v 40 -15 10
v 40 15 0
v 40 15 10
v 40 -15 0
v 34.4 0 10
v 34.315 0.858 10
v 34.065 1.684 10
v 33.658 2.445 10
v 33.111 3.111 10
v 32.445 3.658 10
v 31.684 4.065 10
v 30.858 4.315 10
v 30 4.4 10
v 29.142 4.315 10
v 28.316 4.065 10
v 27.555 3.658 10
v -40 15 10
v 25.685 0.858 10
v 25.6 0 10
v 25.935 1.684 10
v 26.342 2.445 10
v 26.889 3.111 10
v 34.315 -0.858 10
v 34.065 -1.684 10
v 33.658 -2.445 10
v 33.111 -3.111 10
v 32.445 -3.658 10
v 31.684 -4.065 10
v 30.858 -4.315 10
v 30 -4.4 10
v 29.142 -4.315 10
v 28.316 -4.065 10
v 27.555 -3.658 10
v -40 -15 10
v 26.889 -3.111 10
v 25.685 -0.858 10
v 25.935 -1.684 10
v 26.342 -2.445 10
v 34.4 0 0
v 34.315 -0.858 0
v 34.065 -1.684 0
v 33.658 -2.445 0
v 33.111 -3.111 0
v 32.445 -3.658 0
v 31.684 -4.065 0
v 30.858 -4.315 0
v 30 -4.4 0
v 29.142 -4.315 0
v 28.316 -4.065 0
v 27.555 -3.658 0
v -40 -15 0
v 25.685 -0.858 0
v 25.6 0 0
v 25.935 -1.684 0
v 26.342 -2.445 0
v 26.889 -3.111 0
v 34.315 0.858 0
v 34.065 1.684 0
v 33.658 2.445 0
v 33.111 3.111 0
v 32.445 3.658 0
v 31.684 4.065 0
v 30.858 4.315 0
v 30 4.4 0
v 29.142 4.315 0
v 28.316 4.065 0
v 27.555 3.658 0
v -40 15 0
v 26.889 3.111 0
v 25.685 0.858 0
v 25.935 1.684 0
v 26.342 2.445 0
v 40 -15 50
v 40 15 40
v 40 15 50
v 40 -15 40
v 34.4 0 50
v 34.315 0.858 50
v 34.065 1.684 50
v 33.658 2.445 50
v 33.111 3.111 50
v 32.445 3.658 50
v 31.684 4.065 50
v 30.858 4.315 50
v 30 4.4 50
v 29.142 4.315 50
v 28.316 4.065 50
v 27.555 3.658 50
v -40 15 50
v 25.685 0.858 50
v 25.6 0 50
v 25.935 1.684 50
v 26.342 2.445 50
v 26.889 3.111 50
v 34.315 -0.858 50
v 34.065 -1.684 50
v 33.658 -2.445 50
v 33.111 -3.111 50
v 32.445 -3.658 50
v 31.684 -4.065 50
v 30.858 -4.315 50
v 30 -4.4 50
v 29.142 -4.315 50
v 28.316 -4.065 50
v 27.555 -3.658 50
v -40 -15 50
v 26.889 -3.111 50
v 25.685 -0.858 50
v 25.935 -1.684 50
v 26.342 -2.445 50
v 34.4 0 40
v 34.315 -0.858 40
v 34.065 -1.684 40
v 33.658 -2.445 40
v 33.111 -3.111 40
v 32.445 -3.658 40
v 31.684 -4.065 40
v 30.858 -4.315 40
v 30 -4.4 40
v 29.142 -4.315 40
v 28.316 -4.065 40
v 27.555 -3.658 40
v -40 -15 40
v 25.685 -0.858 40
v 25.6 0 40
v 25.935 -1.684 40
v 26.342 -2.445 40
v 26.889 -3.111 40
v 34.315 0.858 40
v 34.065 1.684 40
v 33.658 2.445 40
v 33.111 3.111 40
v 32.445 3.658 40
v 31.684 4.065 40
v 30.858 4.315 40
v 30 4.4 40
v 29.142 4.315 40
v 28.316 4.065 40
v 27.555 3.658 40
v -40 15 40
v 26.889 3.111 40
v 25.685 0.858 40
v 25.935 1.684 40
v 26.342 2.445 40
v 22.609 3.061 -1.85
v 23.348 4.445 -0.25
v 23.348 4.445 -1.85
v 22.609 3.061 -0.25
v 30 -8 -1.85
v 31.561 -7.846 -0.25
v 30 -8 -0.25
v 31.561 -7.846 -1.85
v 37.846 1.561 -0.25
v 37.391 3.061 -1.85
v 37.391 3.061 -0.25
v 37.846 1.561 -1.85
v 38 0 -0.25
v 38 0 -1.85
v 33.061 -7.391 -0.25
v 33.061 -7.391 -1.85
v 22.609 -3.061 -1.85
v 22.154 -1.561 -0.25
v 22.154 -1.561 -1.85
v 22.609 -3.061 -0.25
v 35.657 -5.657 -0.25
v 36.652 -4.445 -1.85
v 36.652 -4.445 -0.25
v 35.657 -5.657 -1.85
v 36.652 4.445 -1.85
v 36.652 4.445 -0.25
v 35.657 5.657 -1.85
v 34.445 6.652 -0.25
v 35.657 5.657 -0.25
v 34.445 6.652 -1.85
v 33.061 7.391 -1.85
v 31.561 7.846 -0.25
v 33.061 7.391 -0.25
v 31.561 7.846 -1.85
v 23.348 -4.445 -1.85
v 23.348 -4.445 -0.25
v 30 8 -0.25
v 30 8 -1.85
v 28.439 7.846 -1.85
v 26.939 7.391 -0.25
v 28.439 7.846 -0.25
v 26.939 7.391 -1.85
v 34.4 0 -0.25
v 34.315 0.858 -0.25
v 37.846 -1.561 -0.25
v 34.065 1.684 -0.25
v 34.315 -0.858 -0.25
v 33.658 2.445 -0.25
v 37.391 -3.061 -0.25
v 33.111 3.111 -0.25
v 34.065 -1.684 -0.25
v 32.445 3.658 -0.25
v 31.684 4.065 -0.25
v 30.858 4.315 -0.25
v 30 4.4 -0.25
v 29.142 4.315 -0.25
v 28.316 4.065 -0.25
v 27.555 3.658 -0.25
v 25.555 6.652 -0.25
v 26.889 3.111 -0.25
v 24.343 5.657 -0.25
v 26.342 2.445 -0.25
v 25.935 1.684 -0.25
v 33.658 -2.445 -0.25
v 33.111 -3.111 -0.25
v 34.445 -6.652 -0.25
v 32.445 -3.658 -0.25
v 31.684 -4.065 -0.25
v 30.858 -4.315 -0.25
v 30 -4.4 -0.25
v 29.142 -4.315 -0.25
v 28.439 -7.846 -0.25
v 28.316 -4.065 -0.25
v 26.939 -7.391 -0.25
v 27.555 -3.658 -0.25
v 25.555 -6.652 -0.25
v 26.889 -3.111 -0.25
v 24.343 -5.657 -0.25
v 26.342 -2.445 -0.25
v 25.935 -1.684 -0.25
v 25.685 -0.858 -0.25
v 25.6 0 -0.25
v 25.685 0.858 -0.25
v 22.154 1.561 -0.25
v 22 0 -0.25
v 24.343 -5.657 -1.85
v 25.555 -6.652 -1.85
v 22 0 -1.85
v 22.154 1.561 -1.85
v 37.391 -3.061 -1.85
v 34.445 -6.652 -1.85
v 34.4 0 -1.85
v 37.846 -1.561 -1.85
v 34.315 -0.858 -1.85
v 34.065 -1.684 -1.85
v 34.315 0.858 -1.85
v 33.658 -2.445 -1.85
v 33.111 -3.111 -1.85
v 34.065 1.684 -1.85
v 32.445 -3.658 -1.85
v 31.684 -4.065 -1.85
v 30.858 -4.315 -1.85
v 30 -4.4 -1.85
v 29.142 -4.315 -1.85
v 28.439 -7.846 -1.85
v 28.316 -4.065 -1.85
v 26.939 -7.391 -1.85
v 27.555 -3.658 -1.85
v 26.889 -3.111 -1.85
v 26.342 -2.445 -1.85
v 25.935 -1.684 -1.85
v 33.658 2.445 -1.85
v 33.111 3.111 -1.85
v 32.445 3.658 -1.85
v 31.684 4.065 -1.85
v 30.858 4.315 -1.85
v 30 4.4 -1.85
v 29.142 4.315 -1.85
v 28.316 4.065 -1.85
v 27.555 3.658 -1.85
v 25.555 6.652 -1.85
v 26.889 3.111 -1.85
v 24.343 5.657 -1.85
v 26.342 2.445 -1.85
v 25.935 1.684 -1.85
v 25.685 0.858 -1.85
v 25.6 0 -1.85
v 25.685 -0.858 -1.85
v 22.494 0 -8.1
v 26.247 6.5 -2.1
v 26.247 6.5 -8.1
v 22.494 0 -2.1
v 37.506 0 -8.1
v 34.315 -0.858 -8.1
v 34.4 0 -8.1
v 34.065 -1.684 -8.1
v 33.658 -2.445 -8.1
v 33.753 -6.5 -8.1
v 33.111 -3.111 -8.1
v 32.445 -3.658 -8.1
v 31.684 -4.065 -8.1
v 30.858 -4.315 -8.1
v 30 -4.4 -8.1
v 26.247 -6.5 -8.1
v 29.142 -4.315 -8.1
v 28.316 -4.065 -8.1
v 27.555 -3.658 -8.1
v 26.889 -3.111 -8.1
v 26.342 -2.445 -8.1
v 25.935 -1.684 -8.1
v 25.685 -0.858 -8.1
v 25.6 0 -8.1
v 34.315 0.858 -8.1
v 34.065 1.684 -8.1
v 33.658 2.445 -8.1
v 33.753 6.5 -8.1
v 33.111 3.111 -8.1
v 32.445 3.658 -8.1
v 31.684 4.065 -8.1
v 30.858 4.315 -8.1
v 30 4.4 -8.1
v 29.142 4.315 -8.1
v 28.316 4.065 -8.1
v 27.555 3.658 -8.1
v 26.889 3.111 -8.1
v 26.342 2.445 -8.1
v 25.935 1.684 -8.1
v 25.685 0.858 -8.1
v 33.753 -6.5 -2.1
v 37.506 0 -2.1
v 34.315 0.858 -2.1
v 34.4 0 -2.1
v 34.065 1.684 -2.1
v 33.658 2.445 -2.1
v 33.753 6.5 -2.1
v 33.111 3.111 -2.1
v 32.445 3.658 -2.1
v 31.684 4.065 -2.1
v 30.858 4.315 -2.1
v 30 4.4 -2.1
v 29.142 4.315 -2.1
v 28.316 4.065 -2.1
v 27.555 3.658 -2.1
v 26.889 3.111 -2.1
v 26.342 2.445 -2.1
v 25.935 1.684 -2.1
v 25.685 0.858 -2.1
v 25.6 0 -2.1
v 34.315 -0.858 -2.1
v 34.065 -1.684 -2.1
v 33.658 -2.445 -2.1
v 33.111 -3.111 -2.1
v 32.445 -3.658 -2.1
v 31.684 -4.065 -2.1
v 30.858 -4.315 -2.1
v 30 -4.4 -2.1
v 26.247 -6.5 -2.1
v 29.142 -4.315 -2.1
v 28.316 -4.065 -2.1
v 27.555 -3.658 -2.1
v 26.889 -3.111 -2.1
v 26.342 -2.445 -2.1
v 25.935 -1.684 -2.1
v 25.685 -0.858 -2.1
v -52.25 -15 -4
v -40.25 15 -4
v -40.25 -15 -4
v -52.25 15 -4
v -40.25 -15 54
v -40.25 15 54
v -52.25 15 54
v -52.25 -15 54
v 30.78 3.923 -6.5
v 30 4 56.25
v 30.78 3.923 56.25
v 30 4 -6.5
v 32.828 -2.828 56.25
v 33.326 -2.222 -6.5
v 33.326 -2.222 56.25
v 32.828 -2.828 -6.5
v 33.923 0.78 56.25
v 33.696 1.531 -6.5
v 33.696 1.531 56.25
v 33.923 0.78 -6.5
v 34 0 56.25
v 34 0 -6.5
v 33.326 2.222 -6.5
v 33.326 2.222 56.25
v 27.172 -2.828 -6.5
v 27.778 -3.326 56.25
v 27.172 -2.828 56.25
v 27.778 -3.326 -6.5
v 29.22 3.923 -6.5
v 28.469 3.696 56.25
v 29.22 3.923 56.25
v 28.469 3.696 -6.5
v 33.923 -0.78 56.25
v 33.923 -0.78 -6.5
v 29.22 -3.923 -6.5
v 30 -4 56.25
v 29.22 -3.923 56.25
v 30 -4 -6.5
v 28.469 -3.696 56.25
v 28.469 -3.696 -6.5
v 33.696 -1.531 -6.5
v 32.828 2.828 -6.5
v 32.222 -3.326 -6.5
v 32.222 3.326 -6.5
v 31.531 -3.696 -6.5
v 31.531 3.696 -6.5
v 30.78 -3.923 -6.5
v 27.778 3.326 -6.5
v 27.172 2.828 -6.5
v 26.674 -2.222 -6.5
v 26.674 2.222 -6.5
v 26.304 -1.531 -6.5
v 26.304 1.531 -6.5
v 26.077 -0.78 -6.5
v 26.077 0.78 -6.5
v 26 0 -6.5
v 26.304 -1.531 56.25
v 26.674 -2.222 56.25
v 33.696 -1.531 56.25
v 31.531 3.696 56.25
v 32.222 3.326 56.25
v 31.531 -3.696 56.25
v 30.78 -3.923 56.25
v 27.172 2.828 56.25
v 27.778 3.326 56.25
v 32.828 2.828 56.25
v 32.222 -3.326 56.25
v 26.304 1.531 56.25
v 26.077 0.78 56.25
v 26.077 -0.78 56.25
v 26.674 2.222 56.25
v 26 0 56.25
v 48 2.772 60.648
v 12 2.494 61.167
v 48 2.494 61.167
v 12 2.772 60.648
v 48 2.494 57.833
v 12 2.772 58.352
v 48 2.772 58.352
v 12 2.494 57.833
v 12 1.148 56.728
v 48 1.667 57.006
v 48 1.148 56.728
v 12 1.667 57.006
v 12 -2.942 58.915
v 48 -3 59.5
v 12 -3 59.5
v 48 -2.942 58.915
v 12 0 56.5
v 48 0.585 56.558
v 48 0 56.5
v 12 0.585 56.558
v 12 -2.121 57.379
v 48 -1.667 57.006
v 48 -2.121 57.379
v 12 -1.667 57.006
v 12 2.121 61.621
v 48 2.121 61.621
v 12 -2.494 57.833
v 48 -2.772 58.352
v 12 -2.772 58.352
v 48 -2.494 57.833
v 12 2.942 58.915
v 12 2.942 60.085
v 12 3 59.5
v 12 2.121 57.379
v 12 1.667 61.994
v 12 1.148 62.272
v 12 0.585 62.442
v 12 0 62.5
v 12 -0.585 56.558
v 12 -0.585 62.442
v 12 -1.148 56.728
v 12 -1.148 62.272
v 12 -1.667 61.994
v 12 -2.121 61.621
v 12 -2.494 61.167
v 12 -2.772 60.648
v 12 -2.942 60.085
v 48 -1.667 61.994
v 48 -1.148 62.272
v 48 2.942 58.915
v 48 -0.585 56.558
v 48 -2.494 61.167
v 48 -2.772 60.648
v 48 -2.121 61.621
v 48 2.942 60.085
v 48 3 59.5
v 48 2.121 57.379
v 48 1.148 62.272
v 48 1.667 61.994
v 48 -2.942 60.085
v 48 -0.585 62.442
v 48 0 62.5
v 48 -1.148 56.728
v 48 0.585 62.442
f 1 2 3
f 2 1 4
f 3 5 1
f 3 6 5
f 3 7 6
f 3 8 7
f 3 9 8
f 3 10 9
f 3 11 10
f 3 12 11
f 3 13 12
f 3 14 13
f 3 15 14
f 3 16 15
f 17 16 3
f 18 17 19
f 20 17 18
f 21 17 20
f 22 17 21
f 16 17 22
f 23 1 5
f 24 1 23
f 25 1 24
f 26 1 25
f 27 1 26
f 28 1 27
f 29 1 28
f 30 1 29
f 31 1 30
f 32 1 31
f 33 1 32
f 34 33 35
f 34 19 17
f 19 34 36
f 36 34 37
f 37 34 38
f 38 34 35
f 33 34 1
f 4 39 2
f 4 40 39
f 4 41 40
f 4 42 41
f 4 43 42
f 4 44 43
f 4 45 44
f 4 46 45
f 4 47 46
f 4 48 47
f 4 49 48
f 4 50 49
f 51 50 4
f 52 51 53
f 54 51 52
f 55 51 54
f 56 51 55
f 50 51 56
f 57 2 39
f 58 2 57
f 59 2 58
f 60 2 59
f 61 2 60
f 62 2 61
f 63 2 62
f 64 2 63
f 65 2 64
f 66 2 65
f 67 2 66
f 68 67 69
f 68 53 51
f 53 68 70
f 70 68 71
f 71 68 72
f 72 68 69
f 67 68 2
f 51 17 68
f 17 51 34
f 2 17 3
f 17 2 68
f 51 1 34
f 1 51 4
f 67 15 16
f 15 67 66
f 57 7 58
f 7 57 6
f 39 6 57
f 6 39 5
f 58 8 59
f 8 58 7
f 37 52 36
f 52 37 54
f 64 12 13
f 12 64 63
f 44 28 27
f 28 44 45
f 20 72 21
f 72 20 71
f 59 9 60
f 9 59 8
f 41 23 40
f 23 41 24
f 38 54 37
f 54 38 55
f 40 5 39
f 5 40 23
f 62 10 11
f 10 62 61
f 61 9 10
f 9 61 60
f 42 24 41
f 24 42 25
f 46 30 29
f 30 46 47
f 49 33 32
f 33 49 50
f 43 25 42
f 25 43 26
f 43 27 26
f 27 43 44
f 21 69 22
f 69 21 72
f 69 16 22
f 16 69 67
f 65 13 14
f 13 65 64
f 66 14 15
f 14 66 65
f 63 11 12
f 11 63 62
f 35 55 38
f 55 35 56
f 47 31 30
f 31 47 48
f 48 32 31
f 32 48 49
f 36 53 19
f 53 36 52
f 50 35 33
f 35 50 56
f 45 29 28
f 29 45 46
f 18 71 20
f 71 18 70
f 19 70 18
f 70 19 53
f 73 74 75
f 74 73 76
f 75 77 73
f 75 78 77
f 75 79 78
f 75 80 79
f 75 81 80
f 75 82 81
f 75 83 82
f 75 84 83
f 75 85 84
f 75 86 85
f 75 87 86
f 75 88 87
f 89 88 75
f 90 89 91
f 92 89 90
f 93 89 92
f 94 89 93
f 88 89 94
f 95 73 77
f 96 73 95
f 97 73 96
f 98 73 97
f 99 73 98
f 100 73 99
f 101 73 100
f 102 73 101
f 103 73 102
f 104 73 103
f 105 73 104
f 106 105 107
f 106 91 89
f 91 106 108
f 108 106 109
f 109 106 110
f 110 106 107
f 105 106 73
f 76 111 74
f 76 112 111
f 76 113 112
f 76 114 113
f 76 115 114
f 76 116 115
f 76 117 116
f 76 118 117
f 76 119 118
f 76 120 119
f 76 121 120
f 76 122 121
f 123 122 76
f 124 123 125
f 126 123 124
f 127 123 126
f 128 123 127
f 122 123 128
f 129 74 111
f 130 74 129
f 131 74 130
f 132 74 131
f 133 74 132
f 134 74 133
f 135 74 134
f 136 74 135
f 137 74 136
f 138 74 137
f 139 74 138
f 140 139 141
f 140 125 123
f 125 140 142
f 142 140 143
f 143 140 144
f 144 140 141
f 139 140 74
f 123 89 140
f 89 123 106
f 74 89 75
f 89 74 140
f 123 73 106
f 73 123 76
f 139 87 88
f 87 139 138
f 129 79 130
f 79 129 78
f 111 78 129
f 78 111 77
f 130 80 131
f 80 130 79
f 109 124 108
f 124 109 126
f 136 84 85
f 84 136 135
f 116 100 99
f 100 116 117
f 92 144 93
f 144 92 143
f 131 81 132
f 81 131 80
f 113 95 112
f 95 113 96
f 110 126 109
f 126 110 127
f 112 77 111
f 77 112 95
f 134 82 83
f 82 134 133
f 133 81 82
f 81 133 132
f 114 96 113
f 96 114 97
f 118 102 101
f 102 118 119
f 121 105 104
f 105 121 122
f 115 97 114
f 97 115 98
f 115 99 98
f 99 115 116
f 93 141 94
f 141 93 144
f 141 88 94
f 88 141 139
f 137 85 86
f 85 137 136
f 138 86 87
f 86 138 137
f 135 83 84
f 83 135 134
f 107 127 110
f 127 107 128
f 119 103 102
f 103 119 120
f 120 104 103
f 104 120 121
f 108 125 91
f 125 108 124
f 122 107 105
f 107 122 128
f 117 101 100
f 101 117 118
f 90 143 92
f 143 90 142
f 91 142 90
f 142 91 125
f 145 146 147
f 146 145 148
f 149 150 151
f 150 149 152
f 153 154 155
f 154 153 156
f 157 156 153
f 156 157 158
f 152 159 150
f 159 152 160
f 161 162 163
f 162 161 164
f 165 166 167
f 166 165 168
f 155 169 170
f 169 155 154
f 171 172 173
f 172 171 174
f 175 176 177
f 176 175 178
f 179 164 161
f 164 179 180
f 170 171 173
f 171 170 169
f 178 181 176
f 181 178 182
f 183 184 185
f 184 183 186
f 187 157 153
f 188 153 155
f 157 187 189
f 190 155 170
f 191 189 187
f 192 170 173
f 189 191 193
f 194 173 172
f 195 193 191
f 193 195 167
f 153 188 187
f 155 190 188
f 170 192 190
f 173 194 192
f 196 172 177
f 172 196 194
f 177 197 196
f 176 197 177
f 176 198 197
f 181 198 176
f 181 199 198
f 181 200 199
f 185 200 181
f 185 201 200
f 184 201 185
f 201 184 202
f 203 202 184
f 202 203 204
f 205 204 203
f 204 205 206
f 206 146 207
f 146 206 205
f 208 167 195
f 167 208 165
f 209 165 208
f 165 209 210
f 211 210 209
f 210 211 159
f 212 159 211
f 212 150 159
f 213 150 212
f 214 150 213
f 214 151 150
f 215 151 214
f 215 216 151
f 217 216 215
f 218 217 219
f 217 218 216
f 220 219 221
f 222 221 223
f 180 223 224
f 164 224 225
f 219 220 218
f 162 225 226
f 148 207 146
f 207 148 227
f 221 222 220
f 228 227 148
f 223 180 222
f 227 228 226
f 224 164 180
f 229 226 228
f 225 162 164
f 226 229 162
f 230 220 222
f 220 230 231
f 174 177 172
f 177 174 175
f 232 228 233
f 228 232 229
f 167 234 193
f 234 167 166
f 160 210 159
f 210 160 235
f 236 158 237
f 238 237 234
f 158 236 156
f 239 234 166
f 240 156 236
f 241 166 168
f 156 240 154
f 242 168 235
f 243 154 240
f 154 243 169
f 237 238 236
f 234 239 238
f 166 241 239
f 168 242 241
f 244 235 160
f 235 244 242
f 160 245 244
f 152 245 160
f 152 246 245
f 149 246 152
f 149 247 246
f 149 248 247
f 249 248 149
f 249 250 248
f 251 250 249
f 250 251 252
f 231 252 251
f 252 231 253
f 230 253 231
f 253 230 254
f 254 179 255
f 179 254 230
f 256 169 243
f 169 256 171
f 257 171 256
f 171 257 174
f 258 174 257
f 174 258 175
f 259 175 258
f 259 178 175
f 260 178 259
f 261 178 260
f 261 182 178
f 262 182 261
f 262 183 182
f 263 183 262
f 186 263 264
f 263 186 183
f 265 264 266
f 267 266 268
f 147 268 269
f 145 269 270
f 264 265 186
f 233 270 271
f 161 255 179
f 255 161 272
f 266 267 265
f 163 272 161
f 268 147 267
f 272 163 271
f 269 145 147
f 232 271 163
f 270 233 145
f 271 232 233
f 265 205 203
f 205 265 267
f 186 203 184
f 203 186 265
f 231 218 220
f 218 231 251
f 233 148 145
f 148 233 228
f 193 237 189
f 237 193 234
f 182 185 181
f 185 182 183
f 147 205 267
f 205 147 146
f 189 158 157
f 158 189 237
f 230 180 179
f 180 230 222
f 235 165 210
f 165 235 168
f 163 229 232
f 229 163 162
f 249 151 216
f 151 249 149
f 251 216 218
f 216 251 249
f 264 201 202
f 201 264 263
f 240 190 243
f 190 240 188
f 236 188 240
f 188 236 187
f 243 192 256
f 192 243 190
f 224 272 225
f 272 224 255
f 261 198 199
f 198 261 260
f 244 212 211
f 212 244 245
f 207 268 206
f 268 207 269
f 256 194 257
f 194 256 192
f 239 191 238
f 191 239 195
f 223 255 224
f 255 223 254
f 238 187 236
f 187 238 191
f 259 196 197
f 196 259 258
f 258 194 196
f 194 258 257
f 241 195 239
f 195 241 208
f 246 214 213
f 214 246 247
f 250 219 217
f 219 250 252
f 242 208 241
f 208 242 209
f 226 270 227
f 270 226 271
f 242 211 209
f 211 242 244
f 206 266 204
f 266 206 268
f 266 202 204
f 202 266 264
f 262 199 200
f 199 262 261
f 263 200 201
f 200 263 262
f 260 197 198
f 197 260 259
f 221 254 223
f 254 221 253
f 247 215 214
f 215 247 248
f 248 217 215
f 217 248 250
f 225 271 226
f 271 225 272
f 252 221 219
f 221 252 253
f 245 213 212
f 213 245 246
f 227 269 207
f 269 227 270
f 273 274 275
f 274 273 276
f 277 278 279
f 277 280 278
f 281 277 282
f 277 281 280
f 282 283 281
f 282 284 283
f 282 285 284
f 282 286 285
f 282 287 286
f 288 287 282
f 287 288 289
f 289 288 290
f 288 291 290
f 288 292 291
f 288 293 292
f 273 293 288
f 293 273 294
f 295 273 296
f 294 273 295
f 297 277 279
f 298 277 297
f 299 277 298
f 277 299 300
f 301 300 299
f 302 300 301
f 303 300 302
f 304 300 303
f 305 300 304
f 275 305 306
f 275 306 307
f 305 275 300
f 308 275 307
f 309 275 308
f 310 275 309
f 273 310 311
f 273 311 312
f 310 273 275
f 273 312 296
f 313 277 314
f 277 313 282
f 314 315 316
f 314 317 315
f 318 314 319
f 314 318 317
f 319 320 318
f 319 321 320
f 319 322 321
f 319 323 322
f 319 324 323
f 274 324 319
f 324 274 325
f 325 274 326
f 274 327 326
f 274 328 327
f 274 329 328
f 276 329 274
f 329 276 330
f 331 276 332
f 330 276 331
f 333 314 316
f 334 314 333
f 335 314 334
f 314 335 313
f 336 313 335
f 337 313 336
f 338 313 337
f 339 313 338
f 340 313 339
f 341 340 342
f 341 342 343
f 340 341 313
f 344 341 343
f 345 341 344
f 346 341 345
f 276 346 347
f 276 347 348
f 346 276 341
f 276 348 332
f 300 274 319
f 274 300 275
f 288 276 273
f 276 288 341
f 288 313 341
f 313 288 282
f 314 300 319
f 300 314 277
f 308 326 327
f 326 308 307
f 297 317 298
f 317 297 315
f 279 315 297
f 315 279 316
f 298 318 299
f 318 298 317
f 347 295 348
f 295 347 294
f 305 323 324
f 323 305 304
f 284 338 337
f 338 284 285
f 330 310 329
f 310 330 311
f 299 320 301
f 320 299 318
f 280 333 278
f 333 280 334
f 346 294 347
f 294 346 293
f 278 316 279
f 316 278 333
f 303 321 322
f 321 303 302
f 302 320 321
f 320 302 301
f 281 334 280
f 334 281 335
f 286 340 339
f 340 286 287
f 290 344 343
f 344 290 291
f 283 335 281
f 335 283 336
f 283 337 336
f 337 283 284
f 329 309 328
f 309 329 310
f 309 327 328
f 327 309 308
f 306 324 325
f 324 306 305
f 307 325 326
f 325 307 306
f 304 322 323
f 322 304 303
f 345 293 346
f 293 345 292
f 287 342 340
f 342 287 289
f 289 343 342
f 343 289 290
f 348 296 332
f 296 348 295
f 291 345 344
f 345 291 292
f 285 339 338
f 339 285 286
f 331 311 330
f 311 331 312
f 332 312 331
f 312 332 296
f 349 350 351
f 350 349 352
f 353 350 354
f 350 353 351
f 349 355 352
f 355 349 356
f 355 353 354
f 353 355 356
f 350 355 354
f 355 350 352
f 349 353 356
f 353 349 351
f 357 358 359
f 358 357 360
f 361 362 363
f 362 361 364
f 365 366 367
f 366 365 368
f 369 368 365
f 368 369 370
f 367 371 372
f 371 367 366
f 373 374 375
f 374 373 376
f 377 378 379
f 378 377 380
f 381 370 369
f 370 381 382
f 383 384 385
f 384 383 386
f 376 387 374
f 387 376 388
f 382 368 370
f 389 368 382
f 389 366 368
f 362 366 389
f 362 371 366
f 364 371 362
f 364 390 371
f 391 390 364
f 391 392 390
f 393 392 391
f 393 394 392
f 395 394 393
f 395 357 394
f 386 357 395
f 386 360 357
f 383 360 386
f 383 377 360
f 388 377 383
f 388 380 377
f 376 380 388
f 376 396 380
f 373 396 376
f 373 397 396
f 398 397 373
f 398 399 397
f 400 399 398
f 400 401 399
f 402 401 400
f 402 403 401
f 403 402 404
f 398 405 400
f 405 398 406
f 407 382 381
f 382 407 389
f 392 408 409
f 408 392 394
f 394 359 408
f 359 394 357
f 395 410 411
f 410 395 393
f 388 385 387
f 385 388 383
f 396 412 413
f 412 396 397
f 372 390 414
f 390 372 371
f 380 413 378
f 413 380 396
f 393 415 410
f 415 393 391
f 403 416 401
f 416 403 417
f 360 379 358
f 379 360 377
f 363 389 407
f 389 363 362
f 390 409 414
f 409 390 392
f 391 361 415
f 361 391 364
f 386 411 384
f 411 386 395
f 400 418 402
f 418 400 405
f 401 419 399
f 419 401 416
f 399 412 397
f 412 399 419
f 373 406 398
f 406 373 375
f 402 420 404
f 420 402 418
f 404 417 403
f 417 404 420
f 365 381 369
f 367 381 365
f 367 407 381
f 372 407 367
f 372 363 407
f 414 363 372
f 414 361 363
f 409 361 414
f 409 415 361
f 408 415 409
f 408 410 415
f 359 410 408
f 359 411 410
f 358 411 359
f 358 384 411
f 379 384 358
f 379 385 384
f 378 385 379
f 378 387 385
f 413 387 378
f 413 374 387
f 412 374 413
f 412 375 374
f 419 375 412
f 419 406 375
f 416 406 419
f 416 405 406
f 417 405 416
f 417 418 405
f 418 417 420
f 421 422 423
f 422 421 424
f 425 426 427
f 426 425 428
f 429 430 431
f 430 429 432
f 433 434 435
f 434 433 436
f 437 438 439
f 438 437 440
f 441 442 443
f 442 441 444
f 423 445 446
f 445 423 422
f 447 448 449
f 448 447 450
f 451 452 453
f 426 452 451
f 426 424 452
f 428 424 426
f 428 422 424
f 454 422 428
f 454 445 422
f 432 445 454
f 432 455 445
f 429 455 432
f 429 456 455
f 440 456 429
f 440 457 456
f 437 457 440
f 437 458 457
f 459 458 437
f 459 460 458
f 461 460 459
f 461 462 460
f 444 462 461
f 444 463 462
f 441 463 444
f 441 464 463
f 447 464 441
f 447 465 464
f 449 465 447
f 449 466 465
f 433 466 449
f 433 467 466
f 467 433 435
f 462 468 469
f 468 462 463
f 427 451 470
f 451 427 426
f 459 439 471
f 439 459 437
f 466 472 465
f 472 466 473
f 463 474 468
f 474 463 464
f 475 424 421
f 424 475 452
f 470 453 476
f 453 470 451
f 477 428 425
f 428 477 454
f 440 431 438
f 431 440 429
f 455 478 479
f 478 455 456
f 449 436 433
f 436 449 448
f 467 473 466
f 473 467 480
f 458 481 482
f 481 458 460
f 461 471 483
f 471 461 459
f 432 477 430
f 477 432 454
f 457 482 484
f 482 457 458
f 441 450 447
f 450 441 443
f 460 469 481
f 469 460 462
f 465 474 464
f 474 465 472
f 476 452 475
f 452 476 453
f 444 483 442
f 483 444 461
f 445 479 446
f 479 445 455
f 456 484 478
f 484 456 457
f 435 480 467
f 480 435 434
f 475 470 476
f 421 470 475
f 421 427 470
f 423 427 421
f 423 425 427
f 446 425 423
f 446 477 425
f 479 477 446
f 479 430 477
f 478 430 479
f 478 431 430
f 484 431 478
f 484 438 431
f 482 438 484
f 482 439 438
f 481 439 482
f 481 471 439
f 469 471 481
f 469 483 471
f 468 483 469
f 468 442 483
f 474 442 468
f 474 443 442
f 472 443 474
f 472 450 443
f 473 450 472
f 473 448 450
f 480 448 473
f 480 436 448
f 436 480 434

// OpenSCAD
$fn = 32;

// ------------------------------------------------------------------------
// C clamp: throat 40 mm, screw d8
// Every part is its own module, assembly() places every instance.
// ------------------------------------------------------------------------

// --- part 1 ---
module clamp_arm() {
  difference() {
    translate([-40, -15, 0]) cube([80, 30, 10]);
    translate([30, 0, -1]) cylinder(h = 12, d = 8.8);
  }
}

// --- part 2 ---
module clamp_spine() {
  difference() {
    translate([-29, -15, 0]) cube([58, 30, 12]);
  }
}

// --- part 3 ---
module clamp_screw() {
  translate([0, 0, -31.375]) cylinder(h = 62.75, d = 8);
}

// --- part 4 ---
module clamp_washer() {
  difference() {
      translate([0, 0, 0]) cylinder(h = 1.6, d = 16);
      translate([0, 0, -1]) cylinder(h = 3.6, d = 8.8);
    }
}

// --- part 5 ---
module clamp_nut() {
  difference() {
    linear_extrude(height = 6) polygon(points = [[7.506, 0], [3.753, 6.5], [-3.753, 6.5], [-7.506, 0], [-3.753, -6.5], [3.753, -6.5]]);
    translate([0, 0, -1]) cylinder(h = 8, d = 8.8);
  }
}

// --- part 6 ---
module tommy_bar() {
  translate([0, 0, -18]) cylinder(h = 36, d = 6);
}

// --- assembly ---
module assembly() {
  color([0.80, 0.24, 0.20]) translate([0, 0, 0]) rotate([0, 0, 0]) clamp_arm();
  color([0.20, 0.45, 0.75]) translate([0, 0, 40]) rotate([0, 0, 0]) clamp_arm();
  color([0.25, 0.62, 0.32]) translate([-52.25, 0, 25]) rotate([0, 90, 0]) clamp_spine();
  color([0.92, 0.70, 0.18]) translate([30, 0, 24.875]) rotate([0, 0, 0]) clamp_screw();
  color([0.58, 0.35, 0.70]) translate([30, 0, -1.85]) rotate([0, 0, 0]) clamp_washer();
  color([0.16, 0.66, 0.66]) translate([30, 0, -8.1]) rotate([0, 0, 0]) clamp_nut();
  color([0.85, 0.48, 0.18]) translate([30, 0, 59.5]) rotate([0, 90, 0]) tommy_bar();
}

assembly();
